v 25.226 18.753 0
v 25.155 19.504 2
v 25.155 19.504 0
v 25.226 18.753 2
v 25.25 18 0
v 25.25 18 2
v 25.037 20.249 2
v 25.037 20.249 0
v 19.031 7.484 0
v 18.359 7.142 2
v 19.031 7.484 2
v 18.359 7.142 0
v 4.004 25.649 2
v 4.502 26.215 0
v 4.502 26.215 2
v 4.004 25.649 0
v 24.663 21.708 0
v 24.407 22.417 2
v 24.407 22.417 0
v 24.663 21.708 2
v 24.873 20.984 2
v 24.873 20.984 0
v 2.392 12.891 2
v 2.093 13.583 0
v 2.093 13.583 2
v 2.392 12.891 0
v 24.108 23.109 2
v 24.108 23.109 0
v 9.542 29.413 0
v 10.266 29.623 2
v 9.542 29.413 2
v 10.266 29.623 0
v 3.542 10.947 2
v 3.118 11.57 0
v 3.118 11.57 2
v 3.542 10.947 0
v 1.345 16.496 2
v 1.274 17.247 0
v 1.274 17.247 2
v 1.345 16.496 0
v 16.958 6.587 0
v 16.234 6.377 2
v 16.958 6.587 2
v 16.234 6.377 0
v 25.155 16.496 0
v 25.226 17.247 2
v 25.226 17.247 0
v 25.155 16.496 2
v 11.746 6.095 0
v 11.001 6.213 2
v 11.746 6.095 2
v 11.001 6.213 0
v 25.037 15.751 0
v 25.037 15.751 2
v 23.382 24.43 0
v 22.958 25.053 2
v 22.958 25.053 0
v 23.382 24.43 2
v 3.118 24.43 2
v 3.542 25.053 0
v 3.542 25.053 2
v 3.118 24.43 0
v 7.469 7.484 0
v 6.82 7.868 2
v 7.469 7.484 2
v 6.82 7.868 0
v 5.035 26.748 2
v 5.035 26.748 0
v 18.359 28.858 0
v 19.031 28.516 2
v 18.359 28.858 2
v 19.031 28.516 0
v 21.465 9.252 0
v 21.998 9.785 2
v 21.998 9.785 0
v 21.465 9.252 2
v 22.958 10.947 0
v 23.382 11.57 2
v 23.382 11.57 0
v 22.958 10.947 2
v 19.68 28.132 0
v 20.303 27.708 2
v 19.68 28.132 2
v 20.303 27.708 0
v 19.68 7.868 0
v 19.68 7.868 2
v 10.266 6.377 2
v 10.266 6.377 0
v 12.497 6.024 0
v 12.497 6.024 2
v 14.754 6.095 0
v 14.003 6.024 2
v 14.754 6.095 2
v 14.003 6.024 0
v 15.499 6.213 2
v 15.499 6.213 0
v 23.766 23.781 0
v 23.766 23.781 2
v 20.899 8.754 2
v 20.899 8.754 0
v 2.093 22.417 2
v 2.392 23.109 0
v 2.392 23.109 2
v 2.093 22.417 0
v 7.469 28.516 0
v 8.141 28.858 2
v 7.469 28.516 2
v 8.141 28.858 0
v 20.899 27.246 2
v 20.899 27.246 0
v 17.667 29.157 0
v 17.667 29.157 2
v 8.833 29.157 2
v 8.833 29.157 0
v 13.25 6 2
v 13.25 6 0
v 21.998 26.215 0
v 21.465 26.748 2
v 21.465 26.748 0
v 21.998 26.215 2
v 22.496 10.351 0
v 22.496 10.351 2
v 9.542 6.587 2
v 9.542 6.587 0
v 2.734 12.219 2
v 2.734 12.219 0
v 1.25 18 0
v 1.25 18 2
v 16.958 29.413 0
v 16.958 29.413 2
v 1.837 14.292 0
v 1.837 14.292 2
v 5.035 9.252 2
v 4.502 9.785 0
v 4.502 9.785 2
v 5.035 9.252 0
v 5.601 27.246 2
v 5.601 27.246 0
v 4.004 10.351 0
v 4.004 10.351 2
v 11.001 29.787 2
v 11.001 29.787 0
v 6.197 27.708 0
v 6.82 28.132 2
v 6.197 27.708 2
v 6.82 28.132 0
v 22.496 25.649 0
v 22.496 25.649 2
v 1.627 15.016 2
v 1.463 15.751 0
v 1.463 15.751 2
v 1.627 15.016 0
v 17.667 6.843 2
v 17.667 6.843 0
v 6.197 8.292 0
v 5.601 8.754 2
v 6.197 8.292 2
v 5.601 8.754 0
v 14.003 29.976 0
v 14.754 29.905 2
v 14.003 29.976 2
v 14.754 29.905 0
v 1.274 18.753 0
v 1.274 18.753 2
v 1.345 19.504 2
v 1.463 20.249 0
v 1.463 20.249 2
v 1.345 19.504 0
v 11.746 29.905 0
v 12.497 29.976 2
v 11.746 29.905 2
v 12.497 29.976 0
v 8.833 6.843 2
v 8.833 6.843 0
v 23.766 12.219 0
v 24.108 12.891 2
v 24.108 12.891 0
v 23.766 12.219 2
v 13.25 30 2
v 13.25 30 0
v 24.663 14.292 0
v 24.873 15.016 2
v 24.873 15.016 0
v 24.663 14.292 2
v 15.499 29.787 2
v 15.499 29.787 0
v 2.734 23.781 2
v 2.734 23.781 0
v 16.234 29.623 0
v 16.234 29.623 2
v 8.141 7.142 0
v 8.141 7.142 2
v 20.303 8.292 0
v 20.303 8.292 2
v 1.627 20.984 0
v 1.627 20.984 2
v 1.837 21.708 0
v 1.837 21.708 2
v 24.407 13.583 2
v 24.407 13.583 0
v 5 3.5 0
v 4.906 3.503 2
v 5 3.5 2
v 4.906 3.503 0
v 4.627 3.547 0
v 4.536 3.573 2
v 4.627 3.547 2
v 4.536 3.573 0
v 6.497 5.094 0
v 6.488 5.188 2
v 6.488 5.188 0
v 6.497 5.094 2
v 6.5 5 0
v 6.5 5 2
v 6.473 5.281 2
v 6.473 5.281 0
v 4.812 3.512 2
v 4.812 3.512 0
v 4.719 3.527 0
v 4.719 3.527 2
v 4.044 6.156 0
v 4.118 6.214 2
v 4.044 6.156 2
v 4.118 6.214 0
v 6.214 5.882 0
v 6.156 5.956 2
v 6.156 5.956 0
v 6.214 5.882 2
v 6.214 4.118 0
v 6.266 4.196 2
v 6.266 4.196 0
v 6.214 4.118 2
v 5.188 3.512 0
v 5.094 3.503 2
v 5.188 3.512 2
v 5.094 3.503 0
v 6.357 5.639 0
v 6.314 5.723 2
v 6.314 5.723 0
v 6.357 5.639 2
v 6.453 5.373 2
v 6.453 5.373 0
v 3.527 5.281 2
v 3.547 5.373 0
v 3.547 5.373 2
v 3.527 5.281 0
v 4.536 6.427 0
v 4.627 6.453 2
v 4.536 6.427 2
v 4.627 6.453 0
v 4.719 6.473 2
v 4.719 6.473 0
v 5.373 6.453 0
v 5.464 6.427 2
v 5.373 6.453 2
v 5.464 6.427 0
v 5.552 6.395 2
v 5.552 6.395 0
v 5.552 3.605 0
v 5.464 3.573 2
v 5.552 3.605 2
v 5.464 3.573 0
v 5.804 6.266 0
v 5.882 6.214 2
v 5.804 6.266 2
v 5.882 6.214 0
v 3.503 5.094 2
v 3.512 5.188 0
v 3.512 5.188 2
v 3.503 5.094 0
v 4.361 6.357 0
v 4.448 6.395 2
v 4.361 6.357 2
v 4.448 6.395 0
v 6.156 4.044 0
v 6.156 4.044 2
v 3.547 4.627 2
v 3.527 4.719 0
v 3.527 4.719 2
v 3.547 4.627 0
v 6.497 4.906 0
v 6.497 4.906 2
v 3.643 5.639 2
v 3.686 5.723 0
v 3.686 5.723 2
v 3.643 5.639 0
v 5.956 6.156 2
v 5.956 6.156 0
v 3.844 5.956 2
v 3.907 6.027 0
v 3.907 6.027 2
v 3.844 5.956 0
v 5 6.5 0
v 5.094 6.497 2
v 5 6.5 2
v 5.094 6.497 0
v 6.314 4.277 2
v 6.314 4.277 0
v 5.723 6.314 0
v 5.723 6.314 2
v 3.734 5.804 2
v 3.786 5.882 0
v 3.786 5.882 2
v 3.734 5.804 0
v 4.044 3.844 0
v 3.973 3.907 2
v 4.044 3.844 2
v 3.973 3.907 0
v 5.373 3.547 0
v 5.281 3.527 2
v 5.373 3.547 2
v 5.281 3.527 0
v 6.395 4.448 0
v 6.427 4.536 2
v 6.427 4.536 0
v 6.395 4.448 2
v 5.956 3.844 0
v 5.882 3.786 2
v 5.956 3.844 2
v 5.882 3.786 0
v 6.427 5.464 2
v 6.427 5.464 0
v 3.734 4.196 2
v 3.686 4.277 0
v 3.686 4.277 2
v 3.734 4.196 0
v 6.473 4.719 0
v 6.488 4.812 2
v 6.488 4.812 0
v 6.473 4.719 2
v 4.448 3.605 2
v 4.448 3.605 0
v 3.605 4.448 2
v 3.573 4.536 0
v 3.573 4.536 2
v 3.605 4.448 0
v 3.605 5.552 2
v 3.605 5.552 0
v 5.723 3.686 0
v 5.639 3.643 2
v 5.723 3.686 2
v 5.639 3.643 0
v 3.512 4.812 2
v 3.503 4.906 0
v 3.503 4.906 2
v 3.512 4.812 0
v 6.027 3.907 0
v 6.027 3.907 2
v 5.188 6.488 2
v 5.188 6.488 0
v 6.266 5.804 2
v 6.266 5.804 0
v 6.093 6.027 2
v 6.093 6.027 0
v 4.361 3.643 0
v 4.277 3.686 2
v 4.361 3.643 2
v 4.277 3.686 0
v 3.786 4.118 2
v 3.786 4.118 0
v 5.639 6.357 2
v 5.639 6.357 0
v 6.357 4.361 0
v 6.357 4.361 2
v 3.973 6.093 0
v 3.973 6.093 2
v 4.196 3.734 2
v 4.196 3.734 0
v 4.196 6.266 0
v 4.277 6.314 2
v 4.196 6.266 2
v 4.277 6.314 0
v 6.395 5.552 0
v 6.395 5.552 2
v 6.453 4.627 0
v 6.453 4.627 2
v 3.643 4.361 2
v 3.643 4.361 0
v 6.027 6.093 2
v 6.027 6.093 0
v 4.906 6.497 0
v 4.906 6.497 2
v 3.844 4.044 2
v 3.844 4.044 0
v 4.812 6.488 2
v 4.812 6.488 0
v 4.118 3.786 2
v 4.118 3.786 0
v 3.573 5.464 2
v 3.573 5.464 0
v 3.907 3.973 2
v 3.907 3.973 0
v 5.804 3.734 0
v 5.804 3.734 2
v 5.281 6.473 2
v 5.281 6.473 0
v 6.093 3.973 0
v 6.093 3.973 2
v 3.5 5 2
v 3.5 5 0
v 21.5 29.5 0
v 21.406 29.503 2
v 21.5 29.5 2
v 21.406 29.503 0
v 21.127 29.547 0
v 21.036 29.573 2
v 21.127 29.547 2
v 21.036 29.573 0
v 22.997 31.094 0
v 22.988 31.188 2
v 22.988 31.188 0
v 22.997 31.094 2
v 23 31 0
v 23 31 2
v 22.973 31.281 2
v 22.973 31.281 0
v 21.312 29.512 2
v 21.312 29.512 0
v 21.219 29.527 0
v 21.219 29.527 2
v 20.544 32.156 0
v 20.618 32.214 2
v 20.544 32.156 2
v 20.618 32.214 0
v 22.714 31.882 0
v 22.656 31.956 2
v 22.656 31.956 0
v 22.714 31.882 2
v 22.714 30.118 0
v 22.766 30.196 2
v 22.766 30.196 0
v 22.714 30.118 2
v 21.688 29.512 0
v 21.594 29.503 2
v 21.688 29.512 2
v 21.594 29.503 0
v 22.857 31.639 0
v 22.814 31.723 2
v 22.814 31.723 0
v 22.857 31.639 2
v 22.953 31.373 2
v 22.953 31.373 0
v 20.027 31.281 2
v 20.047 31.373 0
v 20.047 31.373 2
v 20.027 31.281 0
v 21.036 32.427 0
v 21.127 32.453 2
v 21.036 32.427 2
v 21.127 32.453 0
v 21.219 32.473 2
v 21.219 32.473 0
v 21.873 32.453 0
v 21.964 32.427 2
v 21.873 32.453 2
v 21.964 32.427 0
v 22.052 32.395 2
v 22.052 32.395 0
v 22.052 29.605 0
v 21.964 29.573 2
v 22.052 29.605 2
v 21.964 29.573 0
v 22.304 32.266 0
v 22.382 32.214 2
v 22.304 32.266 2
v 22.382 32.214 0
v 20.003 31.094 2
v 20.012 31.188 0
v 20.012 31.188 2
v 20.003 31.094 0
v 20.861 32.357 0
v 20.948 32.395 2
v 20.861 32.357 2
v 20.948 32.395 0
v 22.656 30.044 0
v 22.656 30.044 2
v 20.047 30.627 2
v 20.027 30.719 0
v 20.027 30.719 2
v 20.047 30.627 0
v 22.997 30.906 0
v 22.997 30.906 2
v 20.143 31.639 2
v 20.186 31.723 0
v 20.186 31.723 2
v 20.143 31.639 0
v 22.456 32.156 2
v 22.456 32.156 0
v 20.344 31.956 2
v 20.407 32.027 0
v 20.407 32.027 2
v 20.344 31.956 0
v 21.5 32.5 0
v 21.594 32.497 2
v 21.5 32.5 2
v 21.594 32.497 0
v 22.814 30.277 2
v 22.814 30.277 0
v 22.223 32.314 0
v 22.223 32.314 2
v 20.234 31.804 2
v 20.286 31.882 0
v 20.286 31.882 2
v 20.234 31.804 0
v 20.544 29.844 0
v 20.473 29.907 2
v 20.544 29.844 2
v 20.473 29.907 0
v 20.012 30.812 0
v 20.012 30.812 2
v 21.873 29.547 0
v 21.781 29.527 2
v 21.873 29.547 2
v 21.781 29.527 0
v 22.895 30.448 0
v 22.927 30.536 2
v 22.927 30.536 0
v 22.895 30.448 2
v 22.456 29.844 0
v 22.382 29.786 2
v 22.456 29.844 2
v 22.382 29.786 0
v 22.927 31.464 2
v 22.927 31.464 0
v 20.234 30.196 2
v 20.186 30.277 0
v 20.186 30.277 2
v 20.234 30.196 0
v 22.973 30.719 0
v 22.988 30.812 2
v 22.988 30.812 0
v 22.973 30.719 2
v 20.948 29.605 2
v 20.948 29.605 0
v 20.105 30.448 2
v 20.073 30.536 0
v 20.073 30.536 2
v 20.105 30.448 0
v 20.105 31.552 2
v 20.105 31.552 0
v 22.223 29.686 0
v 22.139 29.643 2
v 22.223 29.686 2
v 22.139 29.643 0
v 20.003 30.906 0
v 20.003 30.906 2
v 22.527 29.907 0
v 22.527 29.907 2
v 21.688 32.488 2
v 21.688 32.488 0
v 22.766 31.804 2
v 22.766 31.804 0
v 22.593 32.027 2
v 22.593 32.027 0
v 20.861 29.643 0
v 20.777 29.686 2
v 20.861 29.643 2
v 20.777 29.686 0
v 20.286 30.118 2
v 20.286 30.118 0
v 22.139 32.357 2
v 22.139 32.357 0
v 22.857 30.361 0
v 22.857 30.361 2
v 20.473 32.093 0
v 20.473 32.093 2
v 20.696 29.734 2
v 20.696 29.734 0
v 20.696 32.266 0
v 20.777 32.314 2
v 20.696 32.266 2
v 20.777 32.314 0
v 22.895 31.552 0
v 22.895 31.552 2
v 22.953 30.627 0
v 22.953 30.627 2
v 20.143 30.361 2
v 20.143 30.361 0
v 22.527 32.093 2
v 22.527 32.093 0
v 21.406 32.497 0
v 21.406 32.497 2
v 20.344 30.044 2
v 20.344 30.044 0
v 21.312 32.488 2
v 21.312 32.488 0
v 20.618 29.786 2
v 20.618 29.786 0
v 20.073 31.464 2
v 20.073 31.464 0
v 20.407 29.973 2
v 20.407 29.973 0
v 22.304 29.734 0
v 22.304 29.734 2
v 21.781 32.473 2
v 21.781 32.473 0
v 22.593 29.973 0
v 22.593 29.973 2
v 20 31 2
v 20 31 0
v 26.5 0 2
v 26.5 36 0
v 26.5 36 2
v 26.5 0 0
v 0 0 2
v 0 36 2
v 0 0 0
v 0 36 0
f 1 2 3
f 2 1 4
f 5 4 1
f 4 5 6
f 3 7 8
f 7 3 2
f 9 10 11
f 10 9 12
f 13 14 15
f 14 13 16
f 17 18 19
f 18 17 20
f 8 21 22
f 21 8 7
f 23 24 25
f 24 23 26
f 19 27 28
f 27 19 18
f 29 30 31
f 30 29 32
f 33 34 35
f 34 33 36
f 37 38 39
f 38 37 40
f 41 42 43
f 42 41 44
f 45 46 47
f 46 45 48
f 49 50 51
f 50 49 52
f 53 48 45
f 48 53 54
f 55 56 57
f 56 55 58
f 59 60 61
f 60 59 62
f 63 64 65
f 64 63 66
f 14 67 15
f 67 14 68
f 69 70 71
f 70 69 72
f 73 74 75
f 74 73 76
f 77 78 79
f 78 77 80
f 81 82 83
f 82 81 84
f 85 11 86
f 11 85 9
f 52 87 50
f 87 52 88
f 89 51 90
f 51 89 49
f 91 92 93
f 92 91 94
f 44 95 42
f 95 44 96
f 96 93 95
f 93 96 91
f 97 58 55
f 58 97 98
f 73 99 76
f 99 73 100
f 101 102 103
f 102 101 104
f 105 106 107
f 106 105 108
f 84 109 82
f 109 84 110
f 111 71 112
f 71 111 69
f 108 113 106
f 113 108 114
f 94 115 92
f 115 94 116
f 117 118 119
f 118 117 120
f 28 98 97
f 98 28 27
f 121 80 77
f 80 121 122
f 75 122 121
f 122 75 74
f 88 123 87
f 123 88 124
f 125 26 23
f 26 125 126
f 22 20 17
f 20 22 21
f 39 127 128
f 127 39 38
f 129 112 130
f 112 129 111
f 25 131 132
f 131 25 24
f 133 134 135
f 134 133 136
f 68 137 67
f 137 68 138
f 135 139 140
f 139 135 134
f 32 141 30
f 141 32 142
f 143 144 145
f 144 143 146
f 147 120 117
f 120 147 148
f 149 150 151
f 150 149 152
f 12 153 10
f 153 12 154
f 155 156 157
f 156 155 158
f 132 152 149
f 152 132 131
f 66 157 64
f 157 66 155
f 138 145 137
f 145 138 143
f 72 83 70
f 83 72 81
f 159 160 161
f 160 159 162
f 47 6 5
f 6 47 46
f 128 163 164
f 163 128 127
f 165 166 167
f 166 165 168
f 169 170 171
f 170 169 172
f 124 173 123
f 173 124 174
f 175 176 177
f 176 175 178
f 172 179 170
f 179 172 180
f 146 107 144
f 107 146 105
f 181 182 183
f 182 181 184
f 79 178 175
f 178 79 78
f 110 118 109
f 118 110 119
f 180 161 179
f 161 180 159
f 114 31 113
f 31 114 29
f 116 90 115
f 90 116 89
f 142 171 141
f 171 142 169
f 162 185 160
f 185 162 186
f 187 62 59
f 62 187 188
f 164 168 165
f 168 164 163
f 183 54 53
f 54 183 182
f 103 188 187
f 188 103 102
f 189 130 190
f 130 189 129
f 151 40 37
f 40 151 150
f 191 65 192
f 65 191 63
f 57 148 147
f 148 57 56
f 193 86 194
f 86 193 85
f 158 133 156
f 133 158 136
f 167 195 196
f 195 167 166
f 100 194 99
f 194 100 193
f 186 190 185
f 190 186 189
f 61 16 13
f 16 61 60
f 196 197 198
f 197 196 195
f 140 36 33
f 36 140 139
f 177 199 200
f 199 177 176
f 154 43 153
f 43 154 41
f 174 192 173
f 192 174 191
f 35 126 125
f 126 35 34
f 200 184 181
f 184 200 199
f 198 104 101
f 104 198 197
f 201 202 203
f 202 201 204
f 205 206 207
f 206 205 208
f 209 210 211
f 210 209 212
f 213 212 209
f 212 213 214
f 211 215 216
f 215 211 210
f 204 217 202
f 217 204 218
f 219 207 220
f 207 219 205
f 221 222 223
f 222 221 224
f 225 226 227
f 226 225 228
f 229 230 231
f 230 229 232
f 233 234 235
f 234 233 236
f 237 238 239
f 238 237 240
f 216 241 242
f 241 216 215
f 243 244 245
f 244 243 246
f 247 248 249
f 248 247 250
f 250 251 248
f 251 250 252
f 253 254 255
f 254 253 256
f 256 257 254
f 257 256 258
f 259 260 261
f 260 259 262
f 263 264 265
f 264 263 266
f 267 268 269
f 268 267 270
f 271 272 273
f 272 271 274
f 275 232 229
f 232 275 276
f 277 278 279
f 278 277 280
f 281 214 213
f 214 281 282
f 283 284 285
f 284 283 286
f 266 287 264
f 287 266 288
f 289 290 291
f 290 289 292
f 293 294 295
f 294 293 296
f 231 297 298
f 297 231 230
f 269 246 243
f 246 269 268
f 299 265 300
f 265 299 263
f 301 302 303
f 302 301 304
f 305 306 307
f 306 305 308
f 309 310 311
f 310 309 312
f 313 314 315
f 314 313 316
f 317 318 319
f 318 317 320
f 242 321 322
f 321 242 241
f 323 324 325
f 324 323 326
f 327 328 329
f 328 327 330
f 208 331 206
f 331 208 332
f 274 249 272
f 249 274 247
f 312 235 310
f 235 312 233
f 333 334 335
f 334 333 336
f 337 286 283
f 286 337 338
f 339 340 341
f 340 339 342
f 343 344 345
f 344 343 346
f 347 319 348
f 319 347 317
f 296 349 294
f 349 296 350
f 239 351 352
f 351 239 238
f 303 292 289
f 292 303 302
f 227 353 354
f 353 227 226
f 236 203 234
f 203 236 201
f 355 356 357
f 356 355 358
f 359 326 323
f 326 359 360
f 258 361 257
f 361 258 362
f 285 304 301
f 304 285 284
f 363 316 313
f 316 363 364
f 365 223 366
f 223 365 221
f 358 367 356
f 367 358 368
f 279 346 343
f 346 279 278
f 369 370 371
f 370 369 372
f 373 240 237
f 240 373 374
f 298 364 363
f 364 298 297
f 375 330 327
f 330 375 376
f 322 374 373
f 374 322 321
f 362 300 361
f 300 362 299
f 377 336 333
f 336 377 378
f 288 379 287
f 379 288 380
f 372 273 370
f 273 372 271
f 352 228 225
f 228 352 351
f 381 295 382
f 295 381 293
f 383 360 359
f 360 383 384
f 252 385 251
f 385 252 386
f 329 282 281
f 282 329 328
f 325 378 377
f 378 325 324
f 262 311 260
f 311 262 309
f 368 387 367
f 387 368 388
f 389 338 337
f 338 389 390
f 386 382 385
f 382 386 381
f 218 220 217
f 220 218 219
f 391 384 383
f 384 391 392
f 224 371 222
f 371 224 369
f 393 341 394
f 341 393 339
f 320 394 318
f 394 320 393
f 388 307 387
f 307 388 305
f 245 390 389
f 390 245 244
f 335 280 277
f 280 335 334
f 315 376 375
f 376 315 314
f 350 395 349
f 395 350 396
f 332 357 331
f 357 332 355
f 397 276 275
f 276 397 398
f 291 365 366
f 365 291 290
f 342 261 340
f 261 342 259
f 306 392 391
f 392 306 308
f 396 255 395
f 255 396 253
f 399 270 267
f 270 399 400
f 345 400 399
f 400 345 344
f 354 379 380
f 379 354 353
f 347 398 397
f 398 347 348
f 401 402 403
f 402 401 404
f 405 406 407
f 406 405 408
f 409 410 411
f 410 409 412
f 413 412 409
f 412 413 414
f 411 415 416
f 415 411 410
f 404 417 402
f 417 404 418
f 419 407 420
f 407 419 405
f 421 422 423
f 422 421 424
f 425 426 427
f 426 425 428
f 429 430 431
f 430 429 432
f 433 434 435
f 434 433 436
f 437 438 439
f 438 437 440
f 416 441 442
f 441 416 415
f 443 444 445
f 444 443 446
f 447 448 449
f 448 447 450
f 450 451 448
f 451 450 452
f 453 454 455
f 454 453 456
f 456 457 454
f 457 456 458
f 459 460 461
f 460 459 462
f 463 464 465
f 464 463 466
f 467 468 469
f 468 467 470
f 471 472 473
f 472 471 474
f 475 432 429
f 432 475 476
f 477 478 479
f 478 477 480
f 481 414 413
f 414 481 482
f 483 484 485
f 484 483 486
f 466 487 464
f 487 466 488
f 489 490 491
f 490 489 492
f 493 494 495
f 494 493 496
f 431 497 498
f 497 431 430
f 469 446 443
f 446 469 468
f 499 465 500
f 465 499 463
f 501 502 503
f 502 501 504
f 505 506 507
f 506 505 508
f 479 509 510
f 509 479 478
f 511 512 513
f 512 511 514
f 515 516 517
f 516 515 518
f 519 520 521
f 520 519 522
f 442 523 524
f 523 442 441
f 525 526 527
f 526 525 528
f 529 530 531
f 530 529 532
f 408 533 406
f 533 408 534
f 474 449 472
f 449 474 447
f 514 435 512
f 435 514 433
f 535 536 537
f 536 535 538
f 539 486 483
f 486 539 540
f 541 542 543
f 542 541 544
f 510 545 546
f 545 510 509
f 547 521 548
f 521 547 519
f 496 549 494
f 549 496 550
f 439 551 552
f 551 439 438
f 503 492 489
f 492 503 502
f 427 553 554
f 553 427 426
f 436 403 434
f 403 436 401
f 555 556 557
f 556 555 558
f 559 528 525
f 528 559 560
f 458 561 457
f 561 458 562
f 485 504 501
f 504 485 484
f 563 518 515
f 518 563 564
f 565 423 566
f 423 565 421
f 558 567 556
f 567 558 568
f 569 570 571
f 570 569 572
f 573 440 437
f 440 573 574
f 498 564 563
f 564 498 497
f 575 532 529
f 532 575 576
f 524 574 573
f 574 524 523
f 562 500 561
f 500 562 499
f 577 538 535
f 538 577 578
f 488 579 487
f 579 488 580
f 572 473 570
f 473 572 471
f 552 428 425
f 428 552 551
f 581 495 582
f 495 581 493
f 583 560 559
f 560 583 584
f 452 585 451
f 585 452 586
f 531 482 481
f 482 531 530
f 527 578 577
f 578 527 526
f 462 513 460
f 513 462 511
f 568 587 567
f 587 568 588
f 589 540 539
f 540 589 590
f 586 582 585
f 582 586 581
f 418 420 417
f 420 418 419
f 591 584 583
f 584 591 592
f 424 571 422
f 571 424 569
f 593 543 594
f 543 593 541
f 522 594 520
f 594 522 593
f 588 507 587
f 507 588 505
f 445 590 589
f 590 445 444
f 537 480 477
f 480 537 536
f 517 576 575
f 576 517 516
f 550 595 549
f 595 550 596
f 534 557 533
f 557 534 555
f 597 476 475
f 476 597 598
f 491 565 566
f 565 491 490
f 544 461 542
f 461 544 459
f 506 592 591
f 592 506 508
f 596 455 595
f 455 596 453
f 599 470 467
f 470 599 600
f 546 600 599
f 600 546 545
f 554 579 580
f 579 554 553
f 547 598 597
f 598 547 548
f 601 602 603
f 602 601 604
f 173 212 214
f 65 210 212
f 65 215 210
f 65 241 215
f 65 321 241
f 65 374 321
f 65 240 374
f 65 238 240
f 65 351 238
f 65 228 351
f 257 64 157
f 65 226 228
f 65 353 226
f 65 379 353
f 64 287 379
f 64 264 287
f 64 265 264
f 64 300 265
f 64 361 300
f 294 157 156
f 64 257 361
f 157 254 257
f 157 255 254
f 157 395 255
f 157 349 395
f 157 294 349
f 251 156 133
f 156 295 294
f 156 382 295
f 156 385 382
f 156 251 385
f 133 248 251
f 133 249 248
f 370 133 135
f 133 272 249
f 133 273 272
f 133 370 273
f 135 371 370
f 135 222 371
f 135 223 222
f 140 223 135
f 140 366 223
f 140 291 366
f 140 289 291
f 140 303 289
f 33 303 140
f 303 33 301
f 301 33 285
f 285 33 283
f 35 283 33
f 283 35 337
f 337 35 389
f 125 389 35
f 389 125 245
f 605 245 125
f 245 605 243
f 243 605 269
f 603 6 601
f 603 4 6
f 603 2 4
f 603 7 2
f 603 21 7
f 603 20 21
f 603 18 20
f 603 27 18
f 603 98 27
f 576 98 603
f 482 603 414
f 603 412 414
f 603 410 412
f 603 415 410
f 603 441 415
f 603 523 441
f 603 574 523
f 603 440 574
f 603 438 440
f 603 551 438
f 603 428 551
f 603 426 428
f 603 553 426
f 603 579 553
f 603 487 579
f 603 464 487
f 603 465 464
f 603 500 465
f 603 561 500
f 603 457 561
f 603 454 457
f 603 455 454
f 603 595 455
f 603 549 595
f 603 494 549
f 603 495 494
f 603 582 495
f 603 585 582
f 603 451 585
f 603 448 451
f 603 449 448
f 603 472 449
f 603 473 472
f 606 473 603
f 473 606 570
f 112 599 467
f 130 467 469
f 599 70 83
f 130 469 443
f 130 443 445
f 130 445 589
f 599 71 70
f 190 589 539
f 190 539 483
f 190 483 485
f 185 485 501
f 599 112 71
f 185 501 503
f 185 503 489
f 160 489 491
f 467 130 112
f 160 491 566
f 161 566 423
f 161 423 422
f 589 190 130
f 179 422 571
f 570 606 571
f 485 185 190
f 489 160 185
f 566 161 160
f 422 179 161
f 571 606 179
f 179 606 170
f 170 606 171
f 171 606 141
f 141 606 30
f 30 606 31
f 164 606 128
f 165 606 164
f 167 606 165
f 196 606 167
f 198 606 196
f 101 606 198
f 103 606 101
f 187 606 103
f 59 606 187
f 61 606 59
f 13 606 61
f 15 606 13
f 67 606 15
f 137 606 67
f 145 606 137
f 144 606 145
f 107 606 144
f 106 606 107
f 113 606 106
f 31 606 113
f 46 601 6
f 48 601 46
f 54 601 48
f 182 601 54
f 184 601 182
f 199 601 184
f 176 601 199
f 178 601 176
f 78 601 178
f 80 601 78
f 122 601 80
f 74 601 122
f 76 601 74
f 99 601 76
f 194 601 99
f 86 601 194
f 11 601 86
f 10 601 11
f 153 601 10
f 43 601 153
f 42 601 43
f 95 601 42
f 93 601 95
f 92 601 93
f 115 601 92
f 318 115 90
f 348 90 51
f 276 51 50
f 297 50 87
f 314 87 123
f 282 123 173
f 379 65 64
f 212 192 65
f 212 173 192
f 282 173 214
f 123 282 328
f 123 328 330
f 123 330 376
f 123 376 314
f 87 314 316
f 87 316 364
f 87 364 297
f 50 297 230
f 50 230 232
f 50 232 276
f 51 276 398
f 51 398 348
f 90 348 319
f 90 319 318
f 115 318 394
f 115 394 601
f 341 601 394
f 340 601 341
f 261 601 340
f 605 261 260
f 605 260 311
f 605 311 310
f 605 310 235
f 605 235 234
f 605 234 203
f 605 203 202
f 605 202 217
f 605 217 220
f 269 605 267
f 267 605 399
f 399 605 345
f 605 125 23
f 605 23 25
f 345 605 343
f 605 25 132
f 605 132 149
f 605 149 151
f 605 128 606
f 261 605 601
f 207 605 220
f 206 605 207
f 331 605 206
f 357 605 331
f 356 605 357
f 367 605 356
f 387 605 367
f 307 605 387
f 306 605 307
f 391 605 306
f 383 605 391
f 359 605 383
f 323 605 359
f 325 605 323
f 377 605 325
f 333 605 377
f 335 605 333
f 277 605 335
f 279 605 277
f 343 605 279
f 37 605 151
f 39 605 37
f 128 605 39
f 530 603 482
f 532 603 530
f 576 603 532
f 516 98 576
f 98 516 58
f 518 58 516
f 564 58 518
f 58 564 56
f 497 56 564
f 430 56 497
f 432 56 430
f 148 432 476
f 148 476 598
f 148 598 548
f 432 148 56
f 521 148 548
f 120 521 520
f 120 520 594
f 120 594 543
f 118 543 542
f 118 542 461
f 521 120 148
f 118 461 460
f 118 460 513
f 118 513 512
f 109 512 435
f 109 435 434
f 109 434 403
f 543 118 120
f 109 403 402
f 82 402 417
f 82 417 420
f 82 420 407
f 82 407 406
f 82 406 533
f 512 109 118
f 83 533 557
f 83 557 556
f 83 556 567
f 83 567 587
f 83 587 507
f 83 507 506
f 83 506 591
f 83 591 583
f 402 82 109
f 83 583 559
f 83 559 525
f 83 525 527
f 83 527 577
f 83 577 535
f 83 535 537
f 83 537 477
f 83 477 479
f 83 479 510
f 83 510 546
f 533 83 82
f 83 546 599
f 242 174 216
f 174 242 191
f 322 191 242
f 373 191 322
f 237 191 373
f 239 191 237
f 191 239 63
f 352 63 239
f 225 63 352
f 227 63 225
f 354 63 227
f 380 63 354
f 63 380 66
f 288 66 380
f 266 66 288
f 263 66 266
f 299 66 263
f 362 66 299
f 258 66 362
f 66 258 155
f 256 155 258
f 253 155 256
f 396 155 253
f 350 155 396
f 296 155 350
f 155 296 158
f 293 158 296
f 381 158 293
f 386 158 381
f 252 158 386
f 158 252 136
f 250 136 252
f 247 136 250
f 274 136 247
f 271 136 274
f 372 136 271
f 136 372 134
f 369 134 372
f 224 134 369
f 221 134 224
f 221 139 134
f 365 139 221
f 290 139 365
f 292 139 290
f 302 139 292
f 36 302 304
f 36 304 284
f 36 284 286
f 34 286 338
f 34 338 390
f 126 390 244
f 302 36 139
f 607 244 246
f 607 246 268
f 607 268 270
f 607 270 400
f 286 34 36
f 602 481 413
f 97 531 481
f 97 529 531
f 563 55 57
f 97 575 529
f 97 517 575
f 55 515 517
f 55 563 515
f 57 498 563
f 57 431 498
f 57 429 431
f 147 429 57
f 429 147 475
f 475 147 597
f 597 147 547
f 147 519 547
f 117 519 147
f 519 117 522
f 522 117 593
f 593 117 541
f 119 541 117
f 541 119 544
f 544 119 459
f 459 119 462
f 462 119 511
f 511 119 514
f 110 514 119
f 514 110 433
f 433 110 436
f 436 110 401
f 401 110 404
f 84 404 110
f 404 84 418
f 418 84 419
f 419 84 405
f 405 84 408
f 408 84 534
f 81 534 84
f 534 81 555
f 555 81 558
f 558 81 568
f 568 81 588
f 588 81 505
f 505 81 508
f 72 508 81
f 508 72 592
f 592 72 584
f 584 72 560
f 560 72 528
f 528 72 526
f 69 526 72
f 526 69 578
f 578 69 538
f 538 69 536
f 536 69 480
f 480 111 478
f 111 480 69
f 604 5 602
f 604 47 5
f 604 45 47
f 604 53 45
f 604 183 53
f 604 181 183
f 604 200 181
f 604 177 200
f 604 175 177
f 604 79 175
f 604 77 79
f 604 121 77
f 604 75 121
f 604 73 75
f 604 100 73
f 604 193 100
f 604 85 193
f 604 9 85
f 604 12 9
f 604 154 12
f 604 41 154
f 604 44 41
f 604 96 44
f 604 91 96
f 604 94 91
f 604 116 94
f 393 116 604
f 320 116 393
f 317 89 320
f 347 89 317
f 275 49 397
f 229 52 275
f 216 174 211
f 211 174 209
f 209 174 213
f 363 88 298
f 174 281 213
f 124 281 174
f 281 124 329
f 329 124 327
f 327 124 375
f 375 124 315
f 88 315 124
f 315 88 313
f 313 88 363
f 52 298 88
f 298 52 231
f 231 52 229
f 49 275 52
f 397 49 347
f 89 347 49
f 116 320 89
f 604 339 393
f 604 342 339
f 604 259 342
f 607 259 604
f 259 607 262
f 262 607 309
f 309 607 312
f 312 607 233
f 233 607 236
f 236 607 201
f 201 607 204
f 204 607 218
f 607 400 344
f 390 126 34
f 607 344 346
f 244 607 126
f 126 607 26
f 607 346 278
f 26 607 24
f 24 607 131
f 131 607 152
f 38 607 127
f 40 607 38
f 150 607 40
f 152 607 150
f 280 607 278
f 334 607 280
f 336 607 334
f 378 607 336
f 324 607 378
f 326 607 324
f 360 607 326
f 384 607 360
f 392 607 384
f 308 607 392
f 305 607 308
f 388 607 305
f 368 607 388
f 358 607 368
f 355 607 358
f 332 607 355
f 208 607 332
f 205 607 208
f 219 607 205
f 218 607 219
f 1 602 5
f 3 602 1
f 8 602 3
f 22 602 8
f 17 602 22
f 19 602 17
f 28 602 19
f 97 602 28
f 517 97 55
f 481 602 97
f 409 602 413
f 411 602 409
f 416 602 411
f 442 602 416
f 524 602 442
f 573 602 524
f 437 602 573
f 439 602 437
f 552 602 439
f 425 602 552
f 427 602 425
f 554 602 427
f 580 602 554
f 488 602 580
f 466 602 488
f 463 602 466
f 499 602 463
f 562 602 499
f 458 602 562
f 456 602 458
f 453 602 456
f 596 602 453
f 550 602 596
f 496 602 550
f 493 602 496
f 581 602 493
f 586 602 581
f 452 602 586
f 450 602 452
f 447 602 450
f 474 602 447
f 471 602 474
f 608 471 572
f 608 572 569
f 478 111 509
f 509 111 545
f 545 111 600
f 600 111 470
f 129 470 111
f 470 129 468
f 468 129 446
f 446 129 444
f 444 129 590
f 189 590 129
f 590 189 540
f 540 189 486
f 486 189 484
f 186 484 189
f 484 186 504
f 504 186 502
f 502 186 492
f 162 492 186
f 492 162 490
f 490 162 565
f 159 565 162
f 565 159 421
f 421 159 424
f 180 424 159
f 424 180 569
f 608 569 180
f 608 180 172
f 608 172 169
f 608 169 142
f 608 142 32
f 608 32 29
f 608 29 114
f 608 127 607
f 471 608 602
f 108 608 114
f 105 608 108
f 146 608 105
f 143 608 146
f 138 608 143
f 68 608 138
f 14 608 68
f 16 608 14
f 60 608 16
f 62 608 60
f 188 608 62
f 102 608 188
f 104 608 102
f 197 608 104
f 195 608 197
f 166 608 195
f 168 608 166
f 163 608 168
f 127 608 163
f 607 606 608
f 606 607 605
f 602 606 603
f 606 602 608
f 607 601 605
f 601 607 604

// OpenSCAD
difference(){
	union(){


        translate([0,0,0]){
           cube([26.5,36,2], center=false);
        }        

        
	}
	union() {
        translate([26.5/2,36/2,-1]){
            rotate([0,0,0]){
               cylinder(h=10, r=12, $fn=100, center=false);
            }
        }
        translate([5,5,0-1]){
            rotate([0,0,0]){
               cylinder(h=10, r=1.5, $fn=100, center=false);
            }
        }
        translate([26.5-5,36-5,-1]){
            rotate([0,0,0]){
               cylinder(h=10, r=1.5, $fn=100, center=false);
            }
        }


	}
}
